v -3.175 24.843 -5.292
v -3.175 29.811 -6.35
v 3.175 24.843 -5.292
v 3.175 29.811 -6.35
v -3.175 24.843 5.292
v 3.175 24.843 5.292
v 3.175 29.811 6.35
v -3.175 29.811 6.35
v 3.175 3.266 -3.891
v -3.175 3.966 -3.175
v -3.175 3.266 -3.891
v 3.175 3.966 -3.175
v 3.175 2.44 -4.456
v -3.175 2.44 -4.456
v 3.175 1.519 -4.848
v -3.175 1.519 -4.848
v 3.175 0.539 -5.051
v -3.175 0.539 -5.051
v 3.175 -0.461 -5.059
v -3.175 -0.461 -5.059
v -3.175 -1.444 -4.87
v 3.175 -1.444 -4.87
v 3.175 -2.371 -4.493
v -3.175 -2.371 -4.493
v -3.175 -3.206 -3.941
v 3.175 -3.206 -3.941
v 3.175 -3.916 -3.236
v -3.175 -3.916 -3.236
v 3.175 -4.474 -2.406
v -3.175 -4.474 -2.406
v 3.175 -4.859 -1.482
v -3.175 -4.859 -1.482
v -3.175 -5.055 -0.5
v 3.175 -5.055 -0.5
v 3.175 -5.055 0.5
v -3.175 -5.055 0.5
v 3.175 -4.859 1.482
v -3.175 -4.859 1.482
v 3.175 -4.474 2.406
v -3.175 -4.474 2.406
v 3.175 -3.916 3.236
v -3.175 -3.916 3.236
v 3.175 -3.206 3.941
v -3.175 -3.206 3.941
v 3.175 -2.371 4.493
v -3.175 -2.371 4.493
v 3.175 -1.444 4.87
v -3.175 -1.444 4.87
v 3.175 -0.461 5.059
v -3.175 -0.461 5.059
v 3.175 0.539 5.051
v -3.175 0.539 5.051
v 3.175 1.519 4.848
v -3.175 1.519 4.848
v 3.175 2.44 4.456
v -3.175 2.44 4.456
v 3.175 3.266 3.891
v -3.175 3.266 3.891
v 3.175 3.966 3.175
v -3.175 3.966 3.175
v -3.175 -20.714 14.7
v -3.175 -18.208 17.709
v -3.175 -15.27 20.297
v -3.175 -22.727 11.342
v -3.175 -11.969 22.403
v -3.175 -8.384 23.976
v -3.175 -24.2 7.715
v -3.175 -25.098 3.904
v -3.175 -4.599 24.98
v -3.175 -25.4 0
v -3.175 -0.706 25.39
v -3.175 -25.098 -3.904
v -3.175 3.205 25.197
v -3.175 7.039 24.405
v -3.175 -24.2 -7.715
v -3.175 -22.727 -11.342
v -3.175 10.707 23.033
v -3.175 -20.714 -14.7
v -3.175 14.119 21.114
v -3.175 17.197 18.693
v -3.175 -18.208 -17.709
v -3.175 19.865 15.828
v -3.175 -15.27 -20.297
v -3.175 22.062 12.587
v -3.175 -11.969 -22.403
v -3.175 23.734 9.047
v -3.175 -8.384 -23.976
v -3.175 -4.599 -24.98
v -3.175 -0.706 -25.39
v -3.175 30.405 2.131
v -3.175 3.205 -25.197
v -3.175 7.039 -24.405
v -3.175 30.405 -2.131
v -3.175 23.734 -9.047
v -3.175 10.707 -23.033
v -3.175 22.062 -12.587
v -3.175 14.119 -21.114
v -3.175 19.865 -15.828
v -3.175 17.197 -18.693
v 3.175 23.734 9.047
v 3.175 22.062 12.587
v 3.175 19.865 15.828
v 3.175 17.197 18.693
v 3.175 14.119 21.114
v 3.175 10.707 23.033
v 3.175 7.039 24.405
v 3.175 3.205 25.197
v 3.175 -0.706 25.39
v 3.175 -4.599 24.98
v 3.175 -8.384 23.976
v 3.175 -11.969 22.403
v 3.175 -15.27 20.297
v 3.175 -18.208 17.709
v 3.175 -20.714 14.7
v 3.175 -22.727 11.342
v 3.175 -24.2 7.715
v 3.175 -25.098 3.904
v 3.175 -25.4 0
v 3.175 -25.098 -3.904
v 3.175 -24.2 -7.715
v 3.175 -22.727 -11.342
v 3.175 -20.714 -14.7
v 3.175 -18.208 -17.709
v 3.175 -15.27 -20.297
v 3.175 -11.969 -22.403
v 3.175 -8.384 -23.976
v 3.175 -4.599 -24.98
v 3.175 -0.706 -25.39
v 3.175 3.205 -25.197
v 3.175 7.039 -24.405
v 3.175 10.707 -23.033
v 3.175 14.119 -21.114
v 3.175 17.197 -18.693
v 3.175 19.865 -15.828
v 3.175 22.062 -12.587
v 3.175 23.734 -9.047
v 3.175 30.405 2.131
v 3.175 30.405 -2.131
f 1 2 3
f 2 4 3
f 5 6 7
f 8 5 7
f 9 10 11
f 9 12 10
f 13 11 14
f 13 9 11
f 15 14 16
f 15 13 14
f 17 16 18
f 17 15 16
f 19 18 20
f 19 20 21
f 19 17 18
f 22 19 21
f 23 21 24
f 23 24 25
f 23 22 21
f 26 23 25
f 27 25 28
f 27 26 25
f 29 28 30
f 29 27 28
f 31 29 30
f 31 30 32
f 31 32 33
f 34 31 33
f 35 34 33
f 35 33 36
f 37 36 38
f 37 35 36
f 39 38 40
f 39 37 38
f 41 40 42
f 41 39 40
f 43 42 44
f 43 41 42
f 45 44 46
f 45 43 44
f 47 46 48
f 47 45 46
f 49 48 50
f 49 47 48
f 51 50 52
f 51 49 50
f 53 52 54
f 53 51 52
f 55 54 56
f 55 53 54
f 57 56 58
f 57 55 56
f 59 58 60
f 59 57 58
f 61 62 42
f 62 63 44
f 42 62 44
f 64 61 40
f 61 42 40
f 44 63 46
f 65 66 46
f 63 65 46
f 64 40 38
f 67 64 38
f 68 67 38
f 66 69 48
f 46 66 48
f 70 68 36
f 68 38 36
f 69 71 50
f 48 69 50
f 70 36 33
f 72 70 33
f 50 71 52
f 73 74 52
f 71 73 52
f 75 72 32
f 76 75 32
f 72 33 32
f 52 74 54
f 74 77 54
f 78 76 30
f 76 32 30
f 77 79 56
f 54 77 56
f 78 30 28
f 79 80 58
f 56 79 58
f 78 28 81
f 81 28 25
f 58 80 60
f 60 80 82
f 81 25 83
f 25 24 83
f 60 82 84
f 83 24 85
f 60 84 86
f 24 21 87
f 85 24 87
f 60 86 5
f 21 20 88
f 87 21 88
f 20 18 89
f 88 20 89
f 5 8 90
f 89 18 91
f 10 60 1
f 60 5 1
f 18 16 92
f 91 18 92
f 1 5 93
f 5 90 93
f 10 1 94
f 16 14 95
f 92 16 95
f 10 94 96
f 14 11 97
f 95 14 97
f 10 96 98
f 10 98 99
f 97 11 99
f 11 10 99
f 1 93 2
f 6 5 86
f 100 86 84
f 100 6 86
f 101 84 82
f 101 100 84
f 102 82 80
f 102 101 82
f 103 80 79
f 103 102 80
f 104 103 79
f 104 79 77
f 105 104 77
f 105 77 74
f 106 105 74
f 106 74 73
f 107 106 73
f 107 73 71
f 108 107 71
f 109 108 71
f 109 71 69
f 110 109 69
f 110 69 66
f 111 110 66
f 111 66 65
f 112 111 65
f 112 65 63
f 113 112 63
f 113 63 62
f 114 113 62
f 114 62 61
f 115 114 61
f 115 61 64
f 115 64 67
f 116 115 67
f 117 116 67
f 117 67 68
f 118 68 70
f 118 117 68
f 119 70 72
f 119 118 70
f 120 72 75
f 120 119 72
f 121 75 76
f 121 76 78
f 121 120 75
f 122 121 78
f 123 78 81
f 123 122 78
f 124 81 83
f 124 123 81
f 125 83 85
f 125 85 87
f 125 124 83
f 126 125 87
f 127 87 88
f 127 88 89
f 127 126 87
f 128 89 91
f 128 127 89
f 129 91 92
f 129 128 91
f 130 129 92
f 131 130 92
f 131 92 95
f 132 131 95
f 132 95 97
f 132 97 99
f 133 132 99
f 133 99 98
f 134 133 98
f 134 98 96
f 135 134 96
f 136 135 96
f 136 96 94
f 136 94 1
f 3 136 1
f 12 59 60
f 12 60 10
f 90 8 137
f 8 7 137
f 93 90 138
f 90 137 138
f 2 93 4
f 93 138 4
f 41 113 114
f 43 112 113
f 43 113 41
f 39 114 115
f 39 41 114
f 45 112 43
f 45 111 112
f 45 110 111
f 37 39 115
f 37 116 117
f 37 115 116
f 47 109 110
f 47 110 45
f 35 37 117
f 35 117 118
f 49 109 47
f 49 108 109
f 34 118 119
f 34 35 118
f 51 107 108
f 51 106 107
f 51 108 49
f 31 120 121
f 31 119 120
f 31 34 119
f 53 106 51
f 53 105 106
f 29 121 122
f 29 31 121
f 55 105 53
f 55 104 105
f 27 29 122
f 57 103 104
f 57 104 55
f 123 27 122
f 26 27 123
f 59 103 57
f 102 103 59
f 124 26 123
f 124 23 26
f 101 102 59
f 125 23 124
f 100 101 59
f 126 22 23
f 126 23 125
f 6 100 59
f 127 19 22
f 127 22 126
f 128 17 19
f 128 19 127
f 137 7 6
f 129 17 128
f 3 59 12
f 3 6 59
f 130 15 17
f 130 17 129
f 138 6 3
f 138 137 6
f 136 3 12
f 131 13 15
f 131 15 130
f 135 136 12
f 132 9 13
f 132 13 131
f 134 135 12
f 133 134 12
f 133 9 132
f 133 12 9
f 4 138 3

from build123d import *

# Parameters (mm, degrees)
SKETCH1_R           = 25.4
BOSS_EXTRUDE1_DEPTH = 3.175
BOSS_EXTRUDE2_DEPTH = 3.175


with BuildPart() as part:
    # Sketch1 → Boss-Extrude1 (new, symmetric)
    with BuildSketch(Plane(origin=(0, 0, 0), x_dir=(0, 0, -1), z_dir=(1, 0, 0))):
        Circle(SKETCH1_R)
        with BuildLine():
            Line((-3.175, 3.965573729), (3.175, 3.965573729))
            ThreePointArc((3.175, 3.965573729), (0, -5.08), (-3.175, 3.965573729))
        make_face(mode=Mode.SUBTRACT)
    extrude(amount=BOSS_EXTRUDE1_DEPTH, both=True)

    # Sketch2 → Boss-Extrude2 (add, symmetric)
    with BuildSketch(Plane(origin=(0, 0, 0), x_dir=(0, 0, -1), z_dir=(1, 0, 0))):
        with BuildLine():
            Line((-5.291666667, 24.842670225), (-6.35, 29.81120427))
            ThreePointArc((-6.35, 29.81120427), (0, 30.48), (6.35, 29.81120427))
            Line((6.35, 29.81120427), (5.291666667, 24.842670225))
            ThreePointArc((5.291666667, 24.842670225), (0, 25.4), (-5.291666667, 24.842670225))
        make_face()
    extrude(amount=BOSS_EXTRUDE2_DEPTH, both=True)


solid = part.part
